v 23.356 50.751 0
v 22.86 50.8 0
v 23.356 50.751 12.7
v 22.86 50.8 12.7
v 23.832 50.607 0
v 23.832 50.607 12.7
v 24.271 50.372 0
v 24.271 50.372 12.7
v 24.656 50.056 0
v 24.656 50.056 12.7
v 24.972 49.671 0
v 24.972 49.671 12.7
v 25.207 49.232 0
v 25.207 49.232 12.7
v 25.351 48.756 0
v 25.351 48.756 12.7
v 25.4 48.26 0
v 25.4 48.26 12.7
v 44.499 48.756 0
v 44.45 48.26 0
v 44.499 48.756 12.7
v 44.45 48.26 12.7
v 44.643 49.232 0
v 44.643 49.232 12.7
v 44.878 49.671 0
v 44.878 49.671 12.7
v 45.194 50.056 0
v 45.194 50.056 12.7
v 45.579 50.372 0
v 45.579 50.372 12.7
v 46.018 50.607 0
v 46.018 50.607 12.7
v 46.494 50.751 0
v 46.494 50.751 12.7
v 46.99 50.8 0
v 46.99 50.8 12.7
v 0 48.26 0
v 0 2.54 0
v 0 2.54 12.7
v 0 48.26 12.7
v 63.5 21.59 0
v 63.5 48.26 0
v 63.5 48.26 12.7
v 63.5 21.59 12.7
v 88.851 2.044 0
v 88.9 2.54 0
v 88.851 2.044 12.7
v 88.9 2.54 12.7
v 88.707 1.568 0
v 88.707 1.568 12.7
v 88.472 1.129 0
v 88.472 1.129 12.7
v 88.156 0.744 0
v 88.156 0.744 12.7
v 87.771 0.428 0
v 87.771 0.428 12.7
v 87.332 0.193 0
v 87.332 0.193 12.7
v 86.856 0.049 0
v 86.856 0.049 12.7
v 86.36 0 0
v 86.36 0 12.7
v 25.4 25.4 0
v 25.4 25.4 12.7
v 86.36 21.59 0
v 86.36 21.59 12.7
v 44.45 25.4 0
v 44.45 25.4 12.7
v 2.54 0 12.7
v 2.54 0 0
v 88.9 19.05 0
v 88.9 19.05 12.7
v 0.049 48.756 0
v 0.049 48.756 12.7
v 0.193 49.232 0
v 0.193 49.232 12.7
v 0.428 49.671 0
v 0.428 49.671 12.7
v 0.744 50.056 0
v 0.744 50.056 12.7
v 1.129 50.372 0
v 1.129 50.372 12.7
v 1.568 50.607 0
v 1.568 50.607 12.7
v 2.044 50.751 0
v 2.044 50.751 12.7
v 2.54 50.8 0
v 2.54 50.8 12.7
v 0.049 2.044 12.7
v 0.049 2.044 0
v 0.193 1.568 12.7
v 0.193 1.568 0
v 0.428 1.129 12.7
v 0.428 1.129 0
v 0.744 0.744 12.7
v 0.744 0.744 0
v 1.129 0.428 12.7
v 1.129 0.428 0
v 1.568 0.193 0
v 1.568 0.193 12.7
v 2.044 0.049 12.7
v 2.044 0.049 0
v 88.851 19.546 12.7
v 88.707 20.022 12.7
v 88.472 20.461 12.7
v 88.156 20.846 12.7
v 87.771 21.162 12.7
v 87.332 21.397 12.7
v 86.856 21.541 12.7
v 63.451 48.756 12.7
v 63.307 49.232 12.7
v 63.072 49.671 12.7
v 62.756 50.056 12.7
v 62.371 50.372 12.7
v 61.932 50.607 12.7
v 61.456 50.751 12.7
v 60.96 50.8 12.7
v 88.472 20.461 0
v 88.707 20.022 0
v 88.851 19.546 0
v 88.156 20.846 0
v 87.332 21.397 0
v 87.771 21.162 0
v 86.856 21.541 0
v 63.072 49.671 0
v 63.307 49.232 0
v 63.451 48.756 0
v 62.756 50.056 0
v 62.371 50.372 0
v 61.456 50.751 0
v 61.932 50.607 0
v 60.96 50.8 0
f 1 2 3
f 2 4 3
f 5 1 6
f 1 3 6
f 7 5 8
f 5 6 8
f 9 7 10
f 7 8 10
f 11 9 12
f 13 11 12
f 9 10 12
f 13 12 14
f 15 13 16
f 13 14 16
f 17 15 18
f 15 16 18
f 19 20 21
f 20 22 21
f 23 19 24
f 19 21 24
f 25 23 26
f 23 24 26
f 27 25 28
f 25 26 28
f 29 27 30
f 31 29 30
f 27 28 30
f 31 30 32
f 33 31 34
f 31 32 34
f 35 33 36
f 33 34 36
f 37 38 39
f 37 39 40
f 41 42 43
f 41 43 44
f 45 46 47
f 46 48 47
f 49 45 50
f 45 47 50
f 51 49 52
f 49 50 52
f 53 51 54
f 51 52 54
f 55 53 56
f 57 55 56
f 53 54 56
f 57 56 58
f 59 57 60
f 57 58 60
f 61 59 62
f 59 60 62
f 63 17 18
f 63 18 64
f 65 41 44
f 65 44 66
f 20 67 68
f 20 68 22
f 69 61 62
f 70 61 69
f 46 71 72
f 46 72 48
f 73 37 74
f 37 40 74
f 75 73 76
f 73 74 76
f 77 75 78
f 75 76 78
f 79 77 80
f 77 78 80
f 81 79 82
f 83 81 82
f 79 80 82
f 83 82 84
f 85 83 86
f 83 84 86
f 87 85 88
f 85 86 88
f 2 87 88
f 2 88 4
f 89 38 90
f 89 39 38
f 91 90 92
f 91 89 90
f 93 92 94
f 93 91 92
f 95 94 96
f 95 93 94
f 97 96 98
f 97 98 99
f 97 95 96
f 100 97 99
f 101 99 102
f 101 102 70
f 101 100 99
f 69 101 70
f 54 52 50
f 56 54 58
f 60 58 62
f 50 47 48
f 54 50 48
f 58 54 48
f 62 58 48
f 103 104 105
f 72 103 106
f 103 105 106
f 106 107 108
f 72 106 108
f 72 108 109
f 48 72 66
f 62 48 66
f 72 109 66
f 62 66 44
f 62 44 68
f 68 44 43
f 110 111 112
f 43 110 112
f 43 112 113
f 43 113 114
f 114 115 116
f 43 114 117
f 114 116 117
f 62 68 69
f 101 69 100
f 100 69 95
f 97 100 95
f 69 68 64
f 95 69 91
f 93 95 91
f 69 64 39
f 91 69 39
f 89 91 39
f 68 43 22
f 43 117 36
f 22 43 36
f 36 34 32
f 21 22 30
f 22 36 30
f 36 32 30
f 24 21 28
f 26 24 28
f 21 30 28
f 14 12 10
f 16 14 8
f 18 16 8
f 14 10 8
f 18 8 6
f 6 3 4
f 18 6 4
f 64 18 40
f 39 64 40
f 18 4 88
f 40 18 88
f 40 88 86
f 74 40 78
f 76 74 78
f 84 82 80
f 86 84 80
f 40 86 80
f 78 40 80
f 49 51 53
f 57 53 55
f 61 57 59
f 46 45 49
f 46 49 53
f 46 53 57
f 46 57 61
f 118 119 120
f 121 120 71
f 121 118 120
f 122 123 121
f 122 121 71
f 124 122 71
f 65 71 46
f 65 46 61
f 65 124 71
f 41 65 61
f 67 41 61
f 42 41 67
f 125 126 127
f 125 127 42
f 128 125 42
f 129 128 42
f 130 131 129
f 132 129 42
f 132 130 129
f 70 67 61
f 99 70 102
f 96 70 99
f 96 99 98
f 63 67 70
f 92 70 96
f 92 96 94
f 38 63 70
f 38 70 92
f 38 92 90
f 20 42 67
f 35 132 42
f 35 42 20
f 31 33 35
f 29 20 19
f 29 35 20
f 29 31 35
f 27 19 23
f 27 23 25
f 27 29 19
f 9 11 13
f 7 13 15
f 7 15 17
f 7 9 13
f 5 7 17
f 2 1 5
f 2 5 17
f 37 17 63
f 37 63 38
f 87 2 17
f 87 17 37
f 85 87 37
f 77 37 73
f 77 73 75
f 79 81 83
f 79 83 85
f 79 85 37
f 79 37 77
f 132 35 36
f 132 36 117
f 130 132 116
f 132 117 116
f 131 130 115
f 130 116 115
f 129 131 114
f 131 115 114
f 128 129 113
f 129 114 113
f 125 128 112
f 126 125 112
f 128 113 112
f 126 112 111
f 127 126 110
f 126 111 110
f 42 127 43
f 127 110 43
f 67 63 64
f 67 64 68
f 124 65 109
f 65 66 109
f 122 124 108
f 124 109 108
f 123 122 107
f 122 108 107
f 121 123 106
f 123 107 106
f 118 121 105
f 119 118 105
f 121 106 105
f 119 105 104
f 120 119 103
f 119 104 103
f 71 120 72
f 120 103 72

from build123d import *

# Parameters (mm, degrees)
BOSS_EXTRUDE1_DEPTH = 12.7
FILLET1_R           = 2.54


with BuildPart() as part:
    # Sketch1 → Boss-Extrude1 (new body)
    with BuildSketch(Plane.XY):
        Polygon((0, 0), (0, 50.8), (25.4, 50.8), (25.4, 25.4), (44.45, 25.4), (44.45, 50.8), (63.5, 50.8), (63.5, 21.59), (88.9, 21.59), (88.9, 0), align=None)
    extrude(amount=BOSS_EXTRUDE1_DEPTH)

    # Fillet1
    fillet1_edges = [part.edges().sort_by_distance(p)[0] for p in [
        (0, 0, 6.35),
        (0, 50.8, 6.35),
        (25.4, 50.8, 6.35),
        (44.45, 50.8, 6.35),
        (63.5, 50.8, 6.35),
        (88.9, 21.59, 6.35),
        (88.9, 0, 6.35),
    ]]
    fillet(fillet1_edges, radius=FILLET1_R)


solid = part.part
